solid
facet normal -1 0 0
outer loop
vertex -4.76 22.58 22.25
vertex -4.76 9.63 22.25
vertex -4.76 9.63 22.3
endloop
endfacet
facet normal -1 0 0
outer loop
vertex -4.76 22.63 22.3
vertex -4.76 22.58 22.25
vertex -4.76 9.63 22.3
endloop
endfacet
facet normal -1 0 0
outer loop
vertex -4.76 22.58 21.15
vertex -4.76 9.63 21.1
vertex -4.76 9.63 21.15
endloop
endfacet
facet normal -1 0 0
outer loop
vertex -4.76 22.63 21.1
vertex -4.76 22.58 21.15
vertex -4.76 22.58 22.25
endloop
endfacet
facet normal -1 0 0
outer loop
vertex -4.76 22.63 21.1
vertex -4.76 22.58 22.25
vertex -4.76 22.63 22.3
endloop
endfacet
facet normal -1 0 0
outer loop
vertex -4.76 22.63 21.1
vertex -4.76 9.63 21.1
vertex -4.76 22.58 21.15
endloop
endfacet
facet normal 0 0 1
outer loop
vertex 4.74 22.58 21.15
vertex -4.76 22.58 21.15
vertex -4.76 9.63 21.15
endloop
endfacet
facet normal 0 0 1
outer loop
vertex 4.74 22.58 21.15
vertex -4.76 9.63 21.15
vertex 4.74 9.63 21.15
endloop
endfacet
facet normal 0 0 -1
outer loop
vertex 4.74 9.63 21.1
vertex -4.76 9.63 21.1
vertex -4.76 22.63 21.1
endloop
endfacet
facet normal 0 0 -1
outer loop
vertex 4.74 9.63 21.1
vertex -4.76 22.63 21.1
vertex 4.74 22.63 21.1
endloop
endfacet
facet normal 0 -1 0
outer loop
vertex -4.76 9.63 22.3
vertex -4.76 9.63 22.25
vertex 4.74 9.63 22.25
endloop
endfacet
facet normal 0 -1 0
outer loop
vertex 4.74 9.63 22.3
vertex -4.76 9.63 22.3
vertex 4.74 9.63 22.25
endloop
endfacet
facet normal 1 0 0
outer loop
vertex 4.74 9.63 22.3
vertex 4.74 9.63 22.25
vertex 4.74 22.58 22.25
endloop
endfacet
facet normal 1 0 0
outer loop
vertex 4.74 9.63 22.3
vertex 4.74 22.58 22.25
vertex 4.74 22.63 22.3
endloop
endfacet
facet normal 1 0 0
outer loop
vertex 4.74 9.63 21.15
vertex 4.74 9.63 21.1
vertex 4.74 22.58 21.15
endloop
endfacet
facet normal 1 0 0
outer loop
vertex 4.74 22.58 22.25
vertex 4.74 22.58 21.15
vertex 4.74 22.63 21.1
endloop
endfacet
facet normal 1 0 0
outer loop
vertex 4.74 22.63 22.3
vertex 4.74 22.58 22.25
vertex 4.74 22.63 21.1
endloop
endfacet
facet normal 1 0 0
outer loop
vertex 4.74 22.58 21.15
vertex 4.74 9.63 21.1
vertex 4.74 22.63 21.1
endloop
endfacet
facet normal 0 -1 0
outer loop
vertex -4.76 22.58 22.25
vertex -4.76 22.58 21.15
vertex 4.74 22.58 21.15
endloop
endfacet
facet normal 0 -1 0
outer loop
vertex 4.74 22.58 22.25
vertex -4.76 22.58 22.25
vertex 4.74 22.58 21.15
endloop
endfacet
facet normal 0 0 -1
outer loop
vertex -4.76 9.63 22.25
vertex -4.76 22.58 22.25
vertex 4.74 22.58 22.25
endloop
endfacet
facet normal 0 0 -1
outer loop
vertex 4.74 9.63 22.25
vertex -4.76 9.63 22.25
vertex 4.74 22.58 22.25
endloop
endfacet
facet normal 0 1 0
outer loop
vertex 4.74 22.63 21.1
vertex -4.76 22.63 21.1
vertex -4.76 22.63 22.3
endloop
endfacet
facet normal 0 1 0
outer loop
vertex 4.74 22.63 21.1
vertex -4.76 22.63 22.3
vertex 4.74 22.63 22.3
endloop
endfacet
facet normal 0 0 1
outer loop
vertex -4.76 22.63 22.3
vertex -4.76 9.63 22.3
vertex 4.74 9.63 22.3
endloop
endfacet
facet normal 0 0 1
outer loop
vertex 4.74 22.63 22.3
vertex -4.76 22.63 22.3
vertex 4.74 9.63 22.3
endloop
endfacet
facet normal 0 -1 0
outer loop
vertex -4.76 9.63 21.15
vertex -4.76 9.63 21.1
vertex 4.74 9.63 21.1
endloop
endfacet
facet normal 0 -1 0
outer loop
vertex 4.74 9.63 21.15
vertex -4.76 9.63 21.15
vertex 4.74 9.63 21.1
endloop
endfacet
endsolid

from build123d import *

# Parameters (mm, degrees)
BOX081_W     = 9.5
BOX081_H     = 12.95
BOX081_DEPTH = 1.1
BOX080_W     = 9.5
BOX080_H     = 13
BOX080_DEPTH = 1.2


with BuildPart() as small_cu_gnd_electrode026:
    # Box081 → Box081 (new body)
    with BuildSketch(Plane.XY.offset(0.05)):
        with Locations((4.75, 6.475)):
            Rectangle(BOX081_W, BOX081_H)
    extrude(amount=BOX081_DEPTH)


with BuildPart() as large_cu_electrode_long_axis_v_y:
    # Box080 → Box080 (new body)
    with BuildSketch(Plane.XY):
        with Locations((4.75, 6.5)):
            Rectangle(BOX080_W, BOX080_H)
    extrude(amount=BOX080_DEPTH)

    # Cut026: cut Small Cu GND Electrode026
    add(small_cu_gnd_electrode026.part, mode=Mode.SUBTRACT)


with BuildPart() as large_cu_electrode_long_axis_v_y_1:
    # Cut026 placement: moved
    add(large_cu_electrode_long_axis_v_y.part.moved(Location((-4.76, 9.63, 21.1))))


solid = large_cu_electrode_long_axis_v_y_1.part
